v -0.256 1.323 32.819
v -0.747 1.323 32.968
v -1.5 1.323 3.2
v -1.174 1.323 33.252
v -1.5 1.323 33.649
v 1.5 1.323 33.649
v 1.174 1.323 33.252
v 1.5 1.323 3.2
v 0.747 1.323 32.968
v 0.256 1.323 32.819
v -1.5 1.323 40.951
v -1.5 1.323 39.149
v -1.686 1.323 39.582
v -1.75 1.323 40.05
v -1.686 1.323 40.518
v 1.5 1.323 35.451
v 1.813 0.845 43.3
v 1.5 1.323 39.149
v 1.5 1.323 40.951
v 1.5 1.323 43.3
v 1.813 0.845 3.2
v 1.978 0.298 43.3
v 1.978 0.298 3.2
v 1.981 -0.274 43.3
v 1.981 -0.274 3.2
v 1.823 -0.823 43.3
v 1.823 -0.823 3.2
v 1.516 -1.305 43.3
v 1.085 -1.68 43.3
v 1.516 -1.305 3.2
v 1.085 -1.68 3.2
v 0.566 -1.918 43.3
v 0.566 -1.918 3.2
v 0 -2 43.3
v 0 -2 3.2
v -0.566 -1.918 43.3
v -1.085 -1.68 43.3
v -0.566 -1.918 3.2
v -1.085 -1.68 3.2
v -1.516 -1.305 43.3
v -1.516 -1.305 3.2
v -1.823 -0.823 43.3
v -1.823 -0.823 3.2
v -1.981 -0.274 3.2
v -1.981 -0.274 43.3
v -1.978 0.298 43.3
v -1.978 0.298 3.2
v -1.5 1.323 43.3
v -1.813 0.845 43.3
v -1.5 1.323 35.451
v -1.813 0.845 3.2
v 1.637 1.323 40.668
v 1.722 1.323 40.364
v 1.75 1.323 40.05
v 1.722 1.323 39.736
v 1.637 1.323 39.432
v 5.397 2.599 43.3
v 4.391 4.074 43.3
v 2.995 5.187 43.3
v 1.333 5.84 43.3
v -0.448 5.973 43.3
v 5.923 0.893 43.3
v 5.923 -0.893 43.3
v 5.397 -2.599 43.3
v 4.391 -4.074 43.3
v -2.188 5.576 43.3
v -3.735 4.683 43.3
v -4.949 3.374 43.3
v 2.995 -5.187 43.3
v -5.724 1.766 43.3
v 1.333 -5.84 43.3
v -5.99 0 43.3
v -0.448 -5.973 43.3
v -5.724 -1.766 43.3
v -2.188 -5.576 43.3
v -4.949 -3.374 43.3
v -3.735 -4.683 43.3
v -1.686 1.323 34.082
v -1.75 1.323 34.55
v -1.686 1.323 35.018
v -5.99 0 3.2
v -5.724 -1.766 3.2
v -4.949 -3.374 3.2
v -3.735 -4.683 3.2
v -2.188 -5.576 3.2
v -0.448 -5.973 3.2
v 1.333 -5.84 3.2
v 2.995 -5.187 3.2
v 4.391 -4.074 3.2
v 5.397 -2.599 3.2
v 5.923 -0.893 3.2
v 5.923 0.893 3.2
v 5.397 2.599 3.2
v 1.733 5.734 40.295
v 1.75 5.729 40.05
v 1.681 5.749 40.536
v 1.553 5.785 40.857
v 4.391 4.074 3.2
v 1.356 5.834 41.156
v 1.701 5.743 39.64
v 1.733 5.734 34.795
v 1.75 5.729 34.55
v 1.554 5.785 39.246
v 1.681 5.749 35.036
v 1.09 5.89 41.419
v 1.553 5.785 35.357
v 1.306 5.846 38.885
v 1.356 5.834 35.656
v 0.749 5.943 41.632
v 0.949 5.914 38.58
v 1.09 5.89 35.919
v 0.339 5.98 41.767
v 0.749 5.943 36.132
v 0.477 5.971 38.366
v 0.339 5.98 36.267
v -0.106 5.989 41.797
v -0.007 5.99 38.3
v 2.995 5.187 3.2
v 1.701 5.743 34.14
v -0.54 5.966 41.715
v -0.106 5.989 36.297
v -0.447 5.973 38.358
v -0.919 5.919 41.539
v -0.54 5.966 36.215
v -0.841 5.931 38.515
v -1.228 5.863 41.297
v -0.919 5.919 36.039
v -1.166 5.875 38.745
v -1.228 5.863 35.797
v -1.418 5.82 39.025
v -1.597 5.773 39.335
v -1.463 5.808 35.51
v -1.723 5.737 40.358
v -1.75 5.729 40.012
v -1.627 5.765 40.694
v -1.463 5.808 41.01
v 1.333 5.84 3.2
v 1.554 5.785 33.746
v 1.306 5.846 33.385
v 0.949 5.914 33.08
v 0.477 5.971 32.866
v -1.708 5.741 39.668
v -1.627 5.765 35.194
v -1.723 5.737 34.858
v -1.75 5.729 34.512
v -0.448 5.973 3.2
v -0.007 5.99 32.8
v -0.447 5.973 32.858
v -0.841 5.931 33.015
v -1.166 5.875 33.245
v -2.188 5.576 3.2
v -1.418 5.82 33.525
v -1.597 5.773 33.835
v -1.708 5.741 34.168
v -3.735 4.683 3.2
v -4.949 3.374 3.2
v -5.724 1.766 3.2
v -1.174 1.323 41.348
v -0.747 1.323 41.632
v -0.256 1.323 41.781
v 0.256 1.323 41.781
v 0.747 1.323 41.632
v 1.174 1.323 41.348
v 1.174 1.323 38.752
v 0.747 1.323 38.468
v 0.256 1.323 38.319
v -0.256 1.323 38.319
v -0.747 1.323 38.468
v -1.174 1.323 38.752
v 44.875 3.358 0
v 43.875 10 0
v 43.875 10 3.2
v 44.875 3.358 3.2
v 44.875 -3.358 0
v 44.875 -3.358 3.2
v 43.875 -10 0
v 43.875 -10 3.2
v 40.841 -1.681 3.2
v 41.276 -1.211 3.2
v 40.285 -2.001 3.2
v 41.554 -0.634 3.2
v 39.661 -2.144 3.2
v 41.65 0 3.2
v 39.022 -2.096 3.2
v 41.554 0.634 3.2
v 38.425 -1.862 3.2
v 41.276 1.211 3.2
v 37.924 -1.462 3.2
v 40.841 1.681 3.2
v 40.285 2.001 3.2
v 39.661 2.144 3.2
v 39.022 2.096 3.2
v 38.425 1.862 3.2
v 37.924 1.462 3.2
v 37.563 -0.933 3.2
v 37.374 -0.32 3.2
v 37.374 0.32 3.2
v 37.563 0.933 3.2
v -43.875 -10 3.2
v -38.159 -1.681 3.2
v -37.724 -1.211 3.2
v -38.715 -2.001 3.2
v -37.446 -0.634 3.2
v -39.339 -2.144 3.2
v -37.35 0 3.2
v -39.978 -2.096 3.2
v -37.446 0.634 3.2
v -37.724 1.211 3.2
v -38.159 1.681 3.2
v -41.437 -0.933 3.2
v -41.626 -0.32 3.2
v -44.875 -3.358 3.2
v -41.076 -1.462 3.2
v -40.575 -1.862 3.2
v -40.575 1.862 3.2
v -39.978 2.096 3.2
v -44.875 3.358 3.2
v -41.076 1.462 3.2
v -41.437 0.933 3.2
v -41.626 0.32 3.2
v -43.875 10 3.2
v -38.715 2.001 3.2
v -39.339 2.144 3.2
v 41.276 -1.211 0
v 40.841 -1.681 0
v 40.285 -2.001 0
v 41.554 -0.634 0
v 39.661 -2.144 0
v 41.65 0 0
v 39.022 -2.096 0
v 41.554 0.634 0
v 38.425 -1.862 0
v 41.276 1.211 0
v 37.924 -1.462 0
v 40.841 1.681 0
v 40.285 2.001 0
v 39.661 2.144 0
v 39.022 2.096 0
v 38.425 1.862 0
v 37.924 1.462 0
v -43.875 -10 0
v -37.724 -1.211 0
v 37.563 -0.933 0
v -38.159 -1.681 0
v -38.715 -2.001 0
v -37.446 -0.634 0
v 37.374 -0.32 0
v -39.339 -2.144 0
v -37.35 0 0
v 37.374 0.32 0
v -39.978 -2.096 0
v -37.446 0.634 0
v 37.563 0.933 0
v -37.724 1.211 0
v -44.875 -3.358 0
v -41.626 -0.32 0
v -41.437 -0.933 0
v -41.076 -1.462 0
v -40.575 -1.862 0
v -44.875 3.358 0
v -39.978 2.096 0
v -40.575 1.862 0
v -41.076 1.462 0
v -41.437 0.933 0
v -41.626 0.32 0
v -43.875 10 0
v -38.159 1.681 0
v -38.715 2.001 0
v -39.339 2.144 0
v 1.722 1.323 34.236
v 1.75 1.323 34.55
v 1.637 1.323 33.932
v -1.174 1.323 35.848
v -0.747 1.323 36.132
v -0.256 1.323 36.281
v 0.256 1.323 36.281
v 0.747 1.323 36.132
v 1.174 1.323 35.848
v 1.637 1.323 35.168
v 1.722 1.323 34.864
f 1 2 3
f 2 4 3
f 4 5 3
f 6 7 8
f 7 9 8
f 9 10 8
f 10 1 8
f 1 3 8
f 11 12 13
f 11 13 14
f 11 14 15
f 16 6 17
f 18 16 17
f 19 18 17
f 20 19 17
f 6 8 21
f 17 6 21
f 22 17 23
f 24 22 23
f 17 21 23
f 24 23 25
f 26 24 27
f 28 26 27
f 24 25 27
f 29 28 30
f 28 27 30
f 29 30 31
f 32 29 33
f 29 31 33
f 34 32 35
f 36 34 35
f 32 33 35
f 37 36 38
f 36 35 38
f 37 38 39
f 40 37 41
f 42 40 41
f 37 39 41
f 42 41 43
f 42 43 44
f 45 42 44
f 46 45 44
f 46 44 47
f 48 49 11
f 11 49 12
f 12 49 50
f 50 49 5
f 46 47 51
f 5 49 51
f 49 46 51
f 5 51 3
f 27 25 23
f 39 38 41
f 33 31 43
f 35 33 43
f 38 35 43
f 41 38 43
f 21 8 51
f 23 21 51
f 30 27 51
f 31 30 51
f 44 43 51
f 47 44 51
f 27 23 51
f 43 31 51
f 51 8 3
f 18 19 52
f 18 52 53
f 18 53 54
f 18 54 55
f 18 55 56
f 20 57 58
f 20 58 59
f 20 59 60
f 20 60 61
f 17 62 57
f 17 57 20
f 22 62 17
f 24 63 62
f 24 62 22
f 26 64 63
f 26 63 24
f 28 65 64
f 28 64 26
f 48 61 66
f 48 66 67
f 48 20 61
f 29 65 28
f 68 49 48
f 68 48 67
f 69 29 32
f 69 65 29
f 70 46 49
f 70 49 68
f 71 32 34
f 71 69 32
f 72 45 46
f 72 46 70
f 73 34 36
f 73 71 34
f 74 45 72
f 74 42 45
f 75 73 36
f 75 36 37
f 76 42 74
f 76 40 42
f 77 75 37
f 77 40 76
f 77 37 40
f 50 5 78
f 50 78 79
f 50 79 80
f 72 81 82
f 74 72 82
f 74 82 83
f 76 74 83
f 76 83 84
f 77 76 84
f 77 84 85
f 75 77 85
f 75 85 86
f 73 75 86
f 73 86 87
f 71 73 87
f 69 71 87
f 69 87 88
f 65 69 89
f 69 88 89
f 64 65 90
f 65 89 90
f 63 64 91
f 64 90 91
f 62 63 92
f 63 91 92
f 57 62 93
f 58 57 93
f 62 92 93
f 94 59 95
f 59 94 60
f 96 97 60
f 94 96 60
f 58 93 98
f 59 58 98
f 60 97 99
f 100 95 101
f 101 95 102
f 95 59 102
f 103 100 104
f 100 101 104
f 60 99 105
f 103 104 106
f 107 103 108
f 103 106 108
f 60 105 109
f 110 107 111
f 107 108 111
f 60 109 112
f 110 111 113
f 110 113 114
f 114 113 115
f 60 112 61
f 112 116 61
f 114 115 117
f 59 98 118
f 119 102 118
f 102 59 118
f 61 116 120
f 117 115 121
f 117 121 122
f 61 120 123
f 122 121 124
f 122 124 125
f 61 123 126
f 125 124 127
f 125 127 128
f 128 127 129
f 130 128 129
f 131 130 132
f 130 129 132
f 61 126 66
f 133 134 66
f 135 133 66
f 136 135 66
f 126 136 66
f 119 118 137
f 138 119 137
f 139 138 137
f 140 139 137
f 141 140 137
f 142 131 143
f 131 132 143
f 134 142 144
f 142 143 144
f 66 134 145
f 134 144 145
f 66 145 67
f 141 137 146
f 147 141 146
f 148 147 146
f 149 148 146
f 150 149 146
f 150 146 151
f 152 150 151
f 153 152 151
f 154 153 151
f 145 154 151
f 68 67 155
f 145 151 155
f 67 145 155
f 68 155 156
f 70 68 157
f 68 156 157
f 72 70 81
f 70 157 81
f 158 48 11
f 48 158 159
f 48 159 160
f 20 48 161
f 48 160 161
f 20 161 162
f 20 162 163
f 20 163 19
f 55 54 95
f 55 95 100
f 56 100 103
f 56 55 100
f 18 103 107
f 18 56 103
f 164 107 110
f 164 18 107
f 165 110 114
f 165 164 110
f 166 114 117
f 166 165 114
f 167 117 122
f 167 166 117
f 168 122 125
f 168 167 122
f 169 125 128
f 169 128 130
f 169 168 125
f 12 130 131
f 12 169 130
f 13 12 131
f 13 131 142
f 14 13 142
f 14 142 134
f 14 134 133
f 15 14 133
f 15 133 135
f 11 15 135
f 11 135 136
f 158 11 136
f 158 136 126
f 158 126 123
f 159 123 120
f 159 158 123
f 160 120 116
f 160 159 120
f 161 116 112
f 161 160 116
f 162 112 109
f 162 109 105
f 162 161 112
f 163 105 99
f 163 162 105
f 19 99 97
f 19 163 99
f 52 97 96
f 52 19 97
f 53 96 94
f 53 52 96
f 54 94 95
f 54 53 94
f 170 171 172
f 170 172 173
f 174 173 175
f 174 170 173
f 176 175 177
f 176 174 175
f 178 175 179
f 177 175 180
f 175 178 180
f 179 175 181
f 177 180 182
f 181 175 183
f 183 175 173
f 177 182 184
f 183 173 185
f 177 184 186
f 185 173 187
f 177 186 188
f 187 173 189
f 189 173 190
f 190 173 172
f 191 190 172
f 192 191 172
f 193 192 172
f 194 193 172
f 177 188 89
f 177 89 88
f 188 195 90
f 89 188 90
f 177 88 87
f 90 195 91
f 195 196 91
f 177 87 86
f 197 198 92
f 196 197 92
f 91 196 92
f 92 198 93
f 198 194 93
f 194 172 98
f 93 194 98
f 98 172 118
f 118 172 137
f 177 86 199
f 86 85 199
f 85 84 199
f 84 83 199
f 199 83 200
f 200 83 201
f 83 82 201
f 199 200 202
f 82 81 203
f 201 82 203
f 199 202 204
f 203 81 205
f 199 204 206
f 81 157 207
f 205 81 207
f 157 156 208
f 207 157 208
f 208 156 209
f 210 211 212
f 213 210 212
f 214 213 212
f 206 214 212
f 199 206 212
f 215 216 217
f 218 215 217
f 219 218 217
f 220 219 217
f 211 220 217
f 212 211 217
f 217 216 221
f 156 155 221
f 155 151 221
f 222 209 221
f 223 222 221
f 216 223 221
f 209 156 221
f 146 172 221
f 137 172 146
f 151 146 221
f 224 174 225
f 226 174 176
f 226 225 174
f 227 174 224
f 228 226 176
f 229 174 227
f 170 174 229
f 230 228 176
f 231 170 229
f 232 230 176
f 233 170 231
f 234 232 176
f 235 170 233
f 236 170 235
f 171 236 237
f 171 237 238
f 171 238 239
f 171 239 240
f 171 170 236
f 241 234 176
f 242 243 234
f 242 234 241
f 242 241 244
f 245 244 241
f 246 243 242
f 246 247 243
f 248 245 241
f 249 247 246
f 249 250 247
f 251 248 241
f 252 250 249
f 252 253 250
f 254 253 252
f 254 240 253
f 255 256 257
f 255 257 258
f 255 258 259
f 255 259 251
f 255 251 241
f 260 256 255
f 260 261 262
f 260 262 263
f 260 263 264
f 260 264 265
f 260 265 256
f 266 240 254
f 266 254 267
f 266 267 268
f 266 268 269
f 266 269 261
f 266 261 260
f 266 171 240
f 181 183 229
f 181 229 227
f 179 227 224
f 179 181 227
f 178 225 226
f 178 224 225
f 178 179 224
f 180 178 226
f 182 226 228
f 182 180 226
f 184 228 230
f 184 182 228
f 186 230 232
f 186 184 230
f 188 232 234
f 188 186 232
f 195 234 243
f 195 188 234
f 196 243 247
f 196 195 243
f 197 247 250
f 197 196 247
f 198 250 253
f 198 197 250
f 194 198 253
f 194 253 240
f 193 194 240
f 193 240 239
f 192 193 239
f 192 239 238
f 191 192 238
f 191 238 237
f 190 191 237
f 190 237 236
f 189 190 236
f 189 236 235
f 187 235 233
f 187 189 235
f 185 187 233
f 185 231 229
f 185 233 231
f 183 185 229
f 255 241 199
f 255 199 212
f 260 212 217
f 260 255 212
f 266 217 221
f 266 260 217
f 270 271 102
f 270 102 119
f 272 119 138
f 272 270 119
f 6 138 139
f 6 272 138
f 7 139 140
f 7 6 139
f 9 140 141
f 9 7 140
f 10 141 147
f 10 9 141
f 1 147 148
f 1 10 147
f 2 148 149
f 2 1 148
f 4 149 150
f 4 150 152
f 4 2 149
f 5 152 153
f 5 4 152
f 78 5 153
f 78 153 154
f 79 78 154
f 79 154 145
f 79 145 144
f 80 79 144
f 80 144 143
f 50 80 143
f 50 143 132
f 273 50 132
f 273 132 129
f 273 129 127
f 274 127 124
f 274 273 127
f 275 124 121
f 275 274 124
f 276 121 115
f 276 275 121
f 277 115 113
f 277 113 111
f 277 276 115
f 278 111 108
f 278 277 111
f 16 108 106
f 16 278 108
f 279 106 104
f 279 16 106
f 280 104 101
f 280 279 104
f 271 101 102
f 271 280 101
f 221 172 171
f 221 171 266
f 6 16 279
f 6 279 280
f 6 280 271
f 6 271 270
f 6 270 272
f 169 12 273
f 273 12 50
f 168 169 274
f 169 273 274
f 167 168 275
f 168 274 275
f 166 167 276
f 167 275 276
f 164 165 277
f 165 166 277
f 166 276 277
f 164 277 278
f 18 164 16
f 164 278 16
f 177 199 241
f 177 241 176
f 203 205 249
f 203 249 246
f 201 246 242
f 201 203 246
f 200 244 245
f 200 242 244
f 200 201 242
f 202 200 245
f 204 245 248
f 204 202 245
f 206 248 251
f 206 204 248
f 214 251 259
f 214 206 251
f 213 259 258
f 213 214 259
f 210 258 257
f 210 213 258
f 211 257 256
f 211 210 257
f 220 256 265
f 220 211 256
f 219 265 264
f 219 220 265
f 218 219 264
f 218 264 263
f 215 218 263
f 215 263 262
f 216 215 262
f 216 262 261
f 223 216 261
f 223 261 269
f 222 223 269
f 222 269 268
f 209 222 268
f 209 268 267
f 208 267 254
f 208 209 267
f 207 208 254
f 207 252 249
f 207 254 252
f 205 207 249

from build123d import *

# Parameters (mm, degrees)
CROQUIS1_R                 = 5.99
SALIENTE_EXTRUIR1_DEPTH    = 43.3
CROQUIS2_R                 = 1.75
CORTAR_EXTRUIR1_DEPTH      = 7.5
CROQUIS3_R                 = 45
SALIENTE_EXTRUIR2_DEPTH    = 3.2
CORTAR_EXTRUIR2_DEPTH      = 77.973307118
CORTAR_EXTRUIR2_DEPTH_BACK = 5
CROQUIS5_R                 = 2.15


with BuildPart() as part:
    # Croquis1 → Saliente-Extruir1 (new body)
    with BuildSketch(Plane.XY):
        with Locations(Location((0, 0, 0), (0, 0, 180))):
            Circle(CROQUIS1_R)
        with BuildLine():
            Line((-1.5, 1.322875656), (1.5, 1.322875656))
            ThreePointArc((1.5, 1.322875656), (0, -2), (-1.5, 1.322875656))
        make_face(mode=Mode.SUBTRACT)
    extrude(amount=SALIENTE_EXTRUIR1_DEPTH)

    # Croquis2 → Cortar-Extruir1 (cut)
    with BuildSketch(Plane(origin=(0, 1.322875656, 0), x_dir=(1, 0, 0), z_dir=(0, 1, 0))):
        with Locations((0, -40.05)):
            Circle(CROQUIS2_R)
        with Locations((0, -34.55)):
            Circle(CROQUIS2_R)
    extrude(amount=CORTAR_EXTRUIR1_DEPTH, mode=Mode.SUBTRACT)

    # Croquis3 → Saliente-Extruir2 (add)
    with BuildSketch(Plane(origin=(0, 0, 0), x_dir=(-1, 0, 0), z_dir=(0, 0, -1))):
        Circle(CROQUIS3_R)
    extrude(amount=-SALIENTE_EXTRUIR2_DEPTH)

    # Croquis5 → Cortar-Extruir2 (cut, two sides: drawn at the far end of the back side and taken through both)
    with BuildSketch(Plane(origin=(0, 0, 0), x_dir=(-1, 0, 0), z_dir=(0, 0, -1)).offset(-CORTAR_EXTRUIR2_DEPTH_BACK)):
        with Locations(Location((-39.5, 0, 0), (0, 0, 180))):
            Circle(CROQUIS5_R)
        with Locations(Location((39.5, 0, 0), (0, 0, 180))):
            Circle(CROQUIS5_R)
        Polygon((0, 10), (-75, 10), (-75, 50), (75, 50), (75, 10), align=None)
        Polygon((75, -50), (75, -10), (0, -10), (-75, -10), (-75, -50), align=None)
    extrude(amount=CORTAR_EXTRUIR2_DEPTH + CORTAR_EXTRUIR2_DEPTH_BACK, mode=Mode.SUBTRACT)


solid = part.part
